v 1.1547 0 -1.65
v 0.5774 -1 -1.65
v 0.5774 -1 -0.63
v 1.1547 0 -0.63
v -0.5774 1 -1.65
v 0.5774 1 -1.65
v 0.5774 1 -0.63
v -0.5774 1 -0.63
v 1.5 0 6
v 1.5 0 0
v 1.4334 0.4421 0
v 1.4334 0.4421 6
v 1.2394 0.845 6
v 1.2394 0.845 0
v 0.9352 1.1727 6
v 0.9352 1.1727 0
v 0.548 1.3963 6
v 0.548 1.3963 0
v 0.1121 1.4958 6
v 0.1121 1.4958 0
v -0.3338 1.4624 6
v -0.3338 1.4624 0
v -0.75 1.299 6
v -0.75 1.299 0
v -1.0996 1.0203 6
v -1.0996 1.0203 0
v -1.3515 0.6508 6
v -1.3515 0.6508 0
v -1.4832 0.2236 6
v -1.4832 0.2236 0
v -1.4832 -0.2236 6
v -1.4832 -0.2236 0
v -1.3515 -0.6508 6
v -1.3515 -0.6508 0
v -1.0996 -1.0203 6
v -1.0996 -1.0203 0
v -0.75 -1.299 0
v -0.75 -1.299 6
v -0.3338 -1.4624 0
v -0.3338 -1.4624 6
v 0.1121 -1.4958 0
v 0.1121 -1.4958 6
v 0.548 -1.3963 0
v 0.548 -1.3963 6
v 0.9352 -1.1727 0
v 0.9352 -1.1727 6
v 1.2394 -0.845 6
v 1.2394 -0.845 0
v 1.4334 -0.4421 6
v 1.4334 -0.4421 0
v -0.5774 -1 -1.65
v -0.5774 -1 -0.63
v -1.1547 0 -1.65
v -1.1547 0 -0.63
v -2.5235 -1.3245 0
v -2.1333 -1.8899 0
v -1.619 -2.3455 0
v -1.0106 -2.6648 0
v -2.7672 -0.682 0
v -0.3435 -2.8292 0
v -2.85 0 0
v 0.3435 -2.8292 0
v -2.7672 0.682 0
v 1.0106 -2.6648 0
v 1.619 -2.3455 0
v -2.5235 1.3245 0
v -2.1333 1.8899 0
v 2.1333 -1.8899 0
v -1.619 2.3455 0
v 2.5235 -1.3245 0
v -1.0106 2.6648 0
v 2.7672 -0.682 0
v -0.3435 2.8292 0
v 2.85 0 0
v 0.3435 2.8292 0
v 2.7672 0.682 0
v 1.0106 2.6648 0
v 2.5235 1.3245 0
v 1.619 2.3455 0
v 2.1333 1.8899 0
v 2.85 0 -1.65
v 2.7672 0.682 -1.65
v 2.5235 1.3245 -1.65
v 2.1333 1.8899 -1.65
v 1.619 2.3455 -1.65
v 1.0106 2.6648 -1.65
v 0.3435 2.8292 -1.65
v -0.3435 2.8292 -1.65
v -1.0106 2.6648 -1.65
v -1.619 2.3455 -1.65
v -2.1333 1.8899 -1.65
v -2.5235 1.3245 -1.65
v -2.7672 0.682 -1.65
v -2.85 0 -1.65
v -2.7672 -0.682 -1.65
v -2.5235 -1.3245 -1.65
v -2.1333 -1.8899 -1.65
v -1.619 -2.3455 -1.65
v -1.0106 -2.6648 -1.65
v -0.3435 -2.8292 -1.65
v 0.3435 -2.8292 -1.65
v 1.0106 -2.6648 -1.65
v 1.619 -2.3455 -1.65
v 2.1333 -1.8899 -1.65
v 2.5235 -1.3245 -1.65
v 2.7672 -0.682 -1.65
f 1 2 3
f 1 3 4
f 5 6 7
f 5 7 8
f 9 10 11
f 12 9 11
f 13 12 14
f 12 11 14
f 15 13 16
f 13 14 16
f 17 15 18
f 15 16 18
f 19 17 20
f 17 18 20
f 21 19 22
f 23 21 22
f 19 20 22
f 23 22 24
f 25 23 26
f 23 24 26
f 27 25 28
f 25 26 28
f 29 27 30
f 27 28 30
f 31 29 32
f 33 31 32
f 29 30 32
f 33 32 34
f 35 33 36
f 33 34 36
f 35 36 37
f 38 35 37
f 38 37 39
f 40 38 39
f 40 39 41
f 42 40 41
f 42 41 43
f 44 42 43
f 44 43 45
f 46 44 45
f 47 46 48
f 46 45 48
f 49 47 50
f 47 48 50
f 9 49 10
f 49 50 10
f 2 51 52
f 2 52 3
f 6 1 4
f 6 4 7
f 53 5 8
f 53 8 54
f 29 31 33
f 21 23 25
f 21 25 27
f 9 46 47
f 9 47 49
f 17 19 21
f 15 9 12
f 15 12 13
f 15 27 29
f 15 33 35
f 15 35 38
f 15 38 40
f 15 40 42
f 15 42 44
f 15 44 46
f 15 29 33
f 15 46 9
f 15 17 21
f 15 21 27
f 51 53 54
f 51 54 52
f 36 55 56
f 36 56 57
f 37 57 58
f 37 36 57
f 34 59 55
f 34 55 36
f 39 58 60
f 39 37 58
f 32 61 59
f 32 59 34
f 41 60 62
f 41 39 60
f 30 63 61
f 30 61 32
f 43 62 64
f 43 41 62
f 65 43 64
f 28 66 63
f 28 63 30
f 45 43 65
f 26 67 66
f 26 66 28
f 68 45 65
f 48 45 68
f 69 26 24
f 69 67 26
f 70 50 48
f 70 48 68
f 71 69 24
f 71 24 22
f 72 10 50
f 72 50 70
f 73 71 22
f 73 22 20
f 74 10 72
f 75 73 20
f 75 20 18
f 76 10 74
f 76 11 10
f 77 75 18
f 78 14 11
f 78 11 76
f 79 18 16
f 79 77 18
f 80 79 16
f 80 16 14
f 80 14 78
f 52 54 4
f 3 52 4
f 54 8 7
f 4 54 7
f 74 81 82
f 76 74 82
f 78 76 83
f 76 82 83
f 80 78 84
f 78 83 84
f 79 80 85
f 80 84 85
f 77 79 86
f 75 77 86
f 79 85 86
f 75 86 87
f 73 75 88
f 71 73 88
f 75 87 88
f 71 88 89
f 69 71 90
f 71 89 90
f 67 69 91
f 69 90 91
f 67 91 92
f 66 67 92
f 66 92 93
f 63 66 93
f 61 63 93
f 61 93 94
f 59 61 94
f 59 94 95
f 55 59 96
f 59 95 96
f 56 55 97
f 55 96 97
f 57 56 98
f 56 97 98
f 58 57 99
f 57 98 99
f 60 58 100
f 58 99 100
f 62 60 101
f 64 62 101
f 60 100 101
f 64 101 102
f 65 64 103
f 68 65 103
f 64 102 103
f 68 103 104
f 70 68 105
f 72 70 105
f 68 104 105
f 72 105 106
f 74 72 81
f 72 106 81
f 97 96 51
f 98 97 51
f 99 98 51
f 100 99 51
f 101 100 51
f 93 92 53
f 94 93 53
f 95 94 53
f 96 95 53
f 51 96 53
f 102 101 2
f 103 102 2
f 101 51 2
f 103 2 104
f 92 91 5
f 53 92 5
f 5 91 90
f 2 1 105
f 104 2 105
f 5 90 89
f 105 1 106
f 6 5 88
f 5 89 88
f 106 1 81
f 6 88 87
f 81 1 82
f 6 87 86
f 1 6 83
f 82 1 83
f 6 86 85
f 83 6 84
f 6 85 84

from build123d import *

# Parameters (mm, degrees)
F_01_START                                     = -1.65
S01_ISO_7380_BUTTON_HEAD_CLEARANCE_ENV_R       = 2.85
F_01_ISO_7380_BUTTON_HEAD_CLEARANCE_ENVE_DEPTH = 1.65
S02_M3_UNDERHEAD_LENGTH_R                      = 1.5
F_02_M3_UNDERHEAD_LENGTH_DEPTH                 = 6
F_03_START                                     = -1.75
F_03_BUTTON_HEAD_HEX_SOCKET_DEPTH              = 1.12


with BuildPart() as part:
    # S01 - ISO 7380 button head clearance envelope → 01 - ISO 7380 button head clearance envelope (new body)
    with BuildSketch(Plane.XY.offset(F_01_START)):
        Circle(S01_ISO_7380_BUTTON_HEAD_CLEARANCE_ENV_R)
    extrude(amount=F_01_ISO_7380_BUTTON_HEAD_CLEARANCE_ENVE_DEPTH)

    # S02 - M3 underhead length → 02 - M3 underhead length (add)
    with BuildSketch(Plane.XY):
        Circle(S02_M3_UNDERHEAD_LENGTH_R)
    extrude(amount=F_02_M3_UNDERHEAD_LENGTH_DEPTH)

    # S03 - Button head hex socket → 03 - Button head hex socket (cut)
    with BuildSketch(Plane.XY.offset(F_03_START)):
        Polygon((1.154700538, 0), (0.577350269, 1), (-0.577350269, 1), (-1.154700538, 0), (-0.577350269, -1), (0.577350269, -1), align=None)
    extrude(amount=F_03_BUTTON_HEAD_HEX_SOCKET_DEPTH, mode=Mode.SUBTRACT)


solid = part.part
